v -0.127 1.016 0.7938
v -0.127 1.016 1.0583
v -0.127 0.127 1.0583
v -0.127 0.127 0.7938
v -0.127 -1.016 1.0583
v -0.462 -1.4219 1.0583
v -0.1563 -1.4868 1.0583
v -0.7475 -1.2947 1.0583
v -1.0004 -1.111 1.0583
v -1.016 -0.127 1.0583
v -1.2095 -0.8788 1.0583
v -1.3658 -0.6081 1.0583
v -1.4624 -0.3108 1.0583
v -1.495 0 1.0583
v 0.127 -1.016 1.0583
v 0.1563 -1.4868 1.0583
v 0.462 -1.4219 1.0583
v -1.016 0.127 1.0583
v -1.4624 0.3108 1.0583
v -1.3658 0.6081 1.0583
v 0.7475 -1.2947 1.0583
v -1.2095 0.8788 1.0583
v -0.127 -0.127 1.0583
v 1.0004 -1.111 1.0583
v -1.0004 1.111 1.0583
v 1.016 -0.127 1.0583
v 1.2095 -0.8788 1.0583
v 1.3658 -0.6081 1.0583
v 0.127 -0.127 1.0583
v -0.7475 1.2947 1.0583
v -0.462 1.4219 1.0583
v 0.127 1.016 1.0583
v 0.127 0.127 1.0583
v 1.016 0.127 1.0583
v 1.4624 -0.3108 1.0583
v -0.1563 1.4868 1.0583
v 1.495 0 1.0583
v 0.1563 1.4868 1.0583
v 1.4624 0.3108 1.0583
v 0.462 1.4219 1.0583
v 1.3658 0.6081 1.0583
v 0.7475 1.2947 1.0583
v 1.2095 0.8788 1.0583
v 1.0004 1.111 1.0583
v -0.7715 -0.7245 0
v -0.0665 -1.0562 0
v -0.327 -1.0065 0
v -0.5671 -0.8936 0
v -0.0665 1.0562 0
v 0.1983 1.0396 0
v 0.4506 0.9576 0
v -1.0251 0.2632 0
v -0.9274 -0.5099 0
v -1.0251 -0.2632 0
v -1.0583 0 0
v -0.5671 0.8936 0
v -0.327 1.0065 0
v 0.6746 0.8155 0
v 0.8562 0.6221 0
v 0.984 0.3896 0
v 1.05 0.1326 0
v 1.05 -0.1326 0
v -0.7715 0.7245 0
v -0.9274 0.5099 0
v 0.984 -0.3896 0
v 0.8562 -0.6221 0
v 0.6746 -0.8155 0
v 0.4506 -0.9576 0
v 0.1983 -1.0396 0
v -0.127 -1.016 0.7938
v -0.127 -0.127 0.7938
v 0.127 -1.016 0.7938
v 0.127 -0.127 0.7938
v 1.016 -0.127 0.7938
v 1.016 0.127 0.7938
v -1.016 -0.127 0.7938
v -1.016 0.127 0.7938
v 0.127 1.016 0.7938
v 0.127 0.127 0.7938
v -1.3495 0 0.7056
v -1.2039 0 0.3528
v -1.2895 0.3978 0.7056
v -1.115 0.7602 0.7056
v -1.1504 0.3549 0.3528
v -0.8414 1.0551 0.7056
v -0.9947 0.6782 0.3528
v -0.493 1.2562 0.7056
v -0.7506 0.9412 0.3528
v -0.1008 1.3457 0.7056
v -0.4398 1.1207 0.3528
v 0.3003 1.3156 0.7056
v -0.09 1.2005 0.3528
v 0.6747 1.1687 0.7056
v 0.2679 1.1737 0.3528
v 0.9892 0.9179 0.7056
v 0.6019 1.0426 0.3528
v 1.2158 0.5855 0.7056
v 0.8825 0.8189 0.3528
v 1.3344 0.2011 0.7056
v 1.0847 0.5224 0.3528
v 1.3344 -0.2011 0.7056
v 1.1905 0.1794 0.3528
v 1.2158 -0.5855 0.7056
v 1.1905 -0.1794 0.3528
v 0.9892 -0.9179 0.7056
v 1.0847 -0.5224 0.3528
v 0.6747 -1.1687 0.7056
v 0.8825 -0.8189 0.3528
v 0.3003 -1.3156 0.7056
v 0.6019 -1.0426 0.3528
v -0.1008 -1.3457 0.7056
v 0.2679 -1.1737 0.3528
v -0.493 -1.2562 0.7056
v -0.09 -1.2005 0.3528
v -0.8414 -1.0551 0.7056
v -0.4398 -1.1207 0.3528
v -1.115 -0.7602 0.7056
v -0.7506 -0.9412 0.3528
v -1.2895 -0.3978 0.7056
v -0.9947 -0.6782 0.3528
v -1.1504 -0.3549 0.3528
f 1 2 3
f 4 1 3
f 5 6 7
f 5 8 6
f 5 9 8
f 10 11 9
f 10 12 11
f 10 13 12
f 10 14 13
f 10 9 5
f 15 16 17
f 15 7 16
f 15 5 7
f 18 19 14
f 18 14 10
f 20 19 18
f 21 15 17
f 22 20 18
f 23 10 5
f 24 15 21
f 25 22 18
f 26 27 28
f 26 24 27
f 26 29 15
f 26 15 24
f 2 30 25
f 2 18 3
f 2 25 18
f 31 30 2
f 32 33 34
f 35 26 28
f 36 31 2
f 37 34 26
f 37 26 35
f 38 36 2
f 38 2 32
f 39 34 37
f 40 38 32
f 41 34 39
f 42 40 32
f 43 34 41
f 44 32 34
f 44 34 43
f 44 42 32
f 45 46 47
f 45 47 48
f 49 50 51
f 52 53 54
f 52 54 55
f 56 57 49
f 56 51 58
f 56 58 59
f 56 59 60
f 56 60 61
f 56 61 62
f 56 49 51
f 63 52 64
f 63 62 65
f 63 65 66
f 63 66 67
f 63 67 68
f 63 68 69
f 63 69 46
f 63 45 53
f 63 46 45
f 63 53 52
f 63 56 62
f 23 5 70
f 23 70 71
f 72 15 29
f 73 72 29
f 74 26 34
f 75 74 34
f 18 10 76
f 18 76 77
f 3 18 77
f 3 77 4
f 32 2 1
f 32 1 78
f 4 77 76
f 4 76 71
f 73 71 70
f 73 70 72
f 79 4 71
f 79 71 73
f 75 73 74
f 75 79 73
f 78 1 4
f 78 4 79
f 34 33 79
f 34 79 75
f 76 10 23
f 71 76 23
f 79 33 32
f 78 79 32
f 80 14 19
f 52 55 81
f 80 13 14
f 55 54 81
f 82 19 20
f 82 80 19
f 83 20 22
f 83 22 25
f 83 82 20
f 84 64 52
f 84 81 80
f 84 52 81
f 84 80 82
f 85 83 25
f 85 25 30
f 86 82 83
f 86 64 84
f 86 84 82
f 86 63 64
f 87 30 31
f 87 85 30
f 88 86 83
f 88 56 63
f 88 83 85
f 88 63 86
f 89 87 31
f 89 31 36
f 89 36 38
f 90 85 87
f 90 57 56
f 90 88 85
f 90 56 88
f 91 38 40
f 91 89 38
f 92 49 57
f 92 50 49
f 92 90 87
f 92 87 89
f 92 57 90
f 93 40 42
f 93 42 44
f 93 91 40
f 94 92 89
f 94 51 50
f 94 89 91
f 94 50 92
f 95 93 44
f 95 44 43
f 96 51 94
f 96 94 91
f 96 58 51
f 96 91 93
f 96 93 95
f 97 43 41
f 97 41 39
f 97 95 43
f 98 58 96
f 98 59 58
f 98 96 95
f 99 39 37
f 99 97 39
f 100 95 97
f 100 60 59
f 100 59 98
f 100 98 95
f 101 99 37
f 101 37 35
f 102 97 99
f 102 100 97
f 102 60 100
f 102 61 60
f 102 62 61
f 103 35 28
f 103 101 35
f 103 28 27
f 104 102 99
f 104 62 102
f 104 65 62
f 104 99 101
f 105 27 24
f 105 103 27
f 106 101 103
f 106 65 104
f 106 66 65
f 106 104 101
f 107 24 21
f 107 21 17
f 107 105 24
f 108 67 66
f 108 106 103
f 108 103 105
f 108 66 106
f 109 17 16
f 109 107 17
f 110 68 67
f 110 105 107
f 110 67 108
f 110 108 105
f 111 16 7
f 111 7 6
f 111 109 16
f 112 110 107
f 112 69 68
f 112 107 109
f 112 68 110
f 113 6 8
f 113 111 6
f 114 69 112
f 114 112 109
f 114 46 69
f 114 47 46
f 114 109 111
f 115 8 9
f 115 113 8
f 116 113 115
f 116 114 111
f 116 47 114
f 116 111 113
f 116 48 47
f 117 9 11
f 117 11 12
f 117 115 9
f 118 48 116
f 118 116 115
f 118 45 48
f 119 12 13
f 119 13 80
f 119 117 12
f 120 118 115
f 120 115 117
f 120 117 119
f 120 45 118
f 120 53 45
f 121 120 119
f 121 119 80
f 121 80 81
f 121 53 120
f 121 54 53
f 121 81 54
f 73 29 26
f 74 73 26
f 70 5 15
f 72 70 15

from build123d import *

# Parameters (mm, degrees)
F2_W     = 0.254
F2_H     = 0.889
F2_H_2   = 0.254
F2_W_2   = 0.889
F3_DEPTH = 0.2645833333


with BuildPart() as f1:
    # F0 (on Front) → F1 (revolve)
    with BuildSketch(Plane.XZ):
        Polygon((-1.0583333333, 0), (0, 0), (0, 1.0583333333), (-1.4950298937, 1.0583333333), align=None)
    revolve(axis=Axis((0, 0, 0.5291666667), (0, 0, -1)))

    # F2 (on face) → F3 (cut)
    with BuildSketch(Plane.XY.offset(1.0583333333)):
        with Locations((0, 0.5715)):
            Rectangle(F2_W, F2_H)
        Rectangle(F2_W, F2_H_2)
        with Locations((-0.5715, 0)):
            Rectangle(F2_W_2, F2_H_2)
        with Locations((0, -0.5715)):
            Rectangle(F2_W, F2_H)
        with Locations((0.5715, 0)):
            Rectangle(F2_W_2, F2_H_2)
    extrude(amount=-F3_DEPTH, mode=Mode.SUBTRACT)


solid = f1.part
